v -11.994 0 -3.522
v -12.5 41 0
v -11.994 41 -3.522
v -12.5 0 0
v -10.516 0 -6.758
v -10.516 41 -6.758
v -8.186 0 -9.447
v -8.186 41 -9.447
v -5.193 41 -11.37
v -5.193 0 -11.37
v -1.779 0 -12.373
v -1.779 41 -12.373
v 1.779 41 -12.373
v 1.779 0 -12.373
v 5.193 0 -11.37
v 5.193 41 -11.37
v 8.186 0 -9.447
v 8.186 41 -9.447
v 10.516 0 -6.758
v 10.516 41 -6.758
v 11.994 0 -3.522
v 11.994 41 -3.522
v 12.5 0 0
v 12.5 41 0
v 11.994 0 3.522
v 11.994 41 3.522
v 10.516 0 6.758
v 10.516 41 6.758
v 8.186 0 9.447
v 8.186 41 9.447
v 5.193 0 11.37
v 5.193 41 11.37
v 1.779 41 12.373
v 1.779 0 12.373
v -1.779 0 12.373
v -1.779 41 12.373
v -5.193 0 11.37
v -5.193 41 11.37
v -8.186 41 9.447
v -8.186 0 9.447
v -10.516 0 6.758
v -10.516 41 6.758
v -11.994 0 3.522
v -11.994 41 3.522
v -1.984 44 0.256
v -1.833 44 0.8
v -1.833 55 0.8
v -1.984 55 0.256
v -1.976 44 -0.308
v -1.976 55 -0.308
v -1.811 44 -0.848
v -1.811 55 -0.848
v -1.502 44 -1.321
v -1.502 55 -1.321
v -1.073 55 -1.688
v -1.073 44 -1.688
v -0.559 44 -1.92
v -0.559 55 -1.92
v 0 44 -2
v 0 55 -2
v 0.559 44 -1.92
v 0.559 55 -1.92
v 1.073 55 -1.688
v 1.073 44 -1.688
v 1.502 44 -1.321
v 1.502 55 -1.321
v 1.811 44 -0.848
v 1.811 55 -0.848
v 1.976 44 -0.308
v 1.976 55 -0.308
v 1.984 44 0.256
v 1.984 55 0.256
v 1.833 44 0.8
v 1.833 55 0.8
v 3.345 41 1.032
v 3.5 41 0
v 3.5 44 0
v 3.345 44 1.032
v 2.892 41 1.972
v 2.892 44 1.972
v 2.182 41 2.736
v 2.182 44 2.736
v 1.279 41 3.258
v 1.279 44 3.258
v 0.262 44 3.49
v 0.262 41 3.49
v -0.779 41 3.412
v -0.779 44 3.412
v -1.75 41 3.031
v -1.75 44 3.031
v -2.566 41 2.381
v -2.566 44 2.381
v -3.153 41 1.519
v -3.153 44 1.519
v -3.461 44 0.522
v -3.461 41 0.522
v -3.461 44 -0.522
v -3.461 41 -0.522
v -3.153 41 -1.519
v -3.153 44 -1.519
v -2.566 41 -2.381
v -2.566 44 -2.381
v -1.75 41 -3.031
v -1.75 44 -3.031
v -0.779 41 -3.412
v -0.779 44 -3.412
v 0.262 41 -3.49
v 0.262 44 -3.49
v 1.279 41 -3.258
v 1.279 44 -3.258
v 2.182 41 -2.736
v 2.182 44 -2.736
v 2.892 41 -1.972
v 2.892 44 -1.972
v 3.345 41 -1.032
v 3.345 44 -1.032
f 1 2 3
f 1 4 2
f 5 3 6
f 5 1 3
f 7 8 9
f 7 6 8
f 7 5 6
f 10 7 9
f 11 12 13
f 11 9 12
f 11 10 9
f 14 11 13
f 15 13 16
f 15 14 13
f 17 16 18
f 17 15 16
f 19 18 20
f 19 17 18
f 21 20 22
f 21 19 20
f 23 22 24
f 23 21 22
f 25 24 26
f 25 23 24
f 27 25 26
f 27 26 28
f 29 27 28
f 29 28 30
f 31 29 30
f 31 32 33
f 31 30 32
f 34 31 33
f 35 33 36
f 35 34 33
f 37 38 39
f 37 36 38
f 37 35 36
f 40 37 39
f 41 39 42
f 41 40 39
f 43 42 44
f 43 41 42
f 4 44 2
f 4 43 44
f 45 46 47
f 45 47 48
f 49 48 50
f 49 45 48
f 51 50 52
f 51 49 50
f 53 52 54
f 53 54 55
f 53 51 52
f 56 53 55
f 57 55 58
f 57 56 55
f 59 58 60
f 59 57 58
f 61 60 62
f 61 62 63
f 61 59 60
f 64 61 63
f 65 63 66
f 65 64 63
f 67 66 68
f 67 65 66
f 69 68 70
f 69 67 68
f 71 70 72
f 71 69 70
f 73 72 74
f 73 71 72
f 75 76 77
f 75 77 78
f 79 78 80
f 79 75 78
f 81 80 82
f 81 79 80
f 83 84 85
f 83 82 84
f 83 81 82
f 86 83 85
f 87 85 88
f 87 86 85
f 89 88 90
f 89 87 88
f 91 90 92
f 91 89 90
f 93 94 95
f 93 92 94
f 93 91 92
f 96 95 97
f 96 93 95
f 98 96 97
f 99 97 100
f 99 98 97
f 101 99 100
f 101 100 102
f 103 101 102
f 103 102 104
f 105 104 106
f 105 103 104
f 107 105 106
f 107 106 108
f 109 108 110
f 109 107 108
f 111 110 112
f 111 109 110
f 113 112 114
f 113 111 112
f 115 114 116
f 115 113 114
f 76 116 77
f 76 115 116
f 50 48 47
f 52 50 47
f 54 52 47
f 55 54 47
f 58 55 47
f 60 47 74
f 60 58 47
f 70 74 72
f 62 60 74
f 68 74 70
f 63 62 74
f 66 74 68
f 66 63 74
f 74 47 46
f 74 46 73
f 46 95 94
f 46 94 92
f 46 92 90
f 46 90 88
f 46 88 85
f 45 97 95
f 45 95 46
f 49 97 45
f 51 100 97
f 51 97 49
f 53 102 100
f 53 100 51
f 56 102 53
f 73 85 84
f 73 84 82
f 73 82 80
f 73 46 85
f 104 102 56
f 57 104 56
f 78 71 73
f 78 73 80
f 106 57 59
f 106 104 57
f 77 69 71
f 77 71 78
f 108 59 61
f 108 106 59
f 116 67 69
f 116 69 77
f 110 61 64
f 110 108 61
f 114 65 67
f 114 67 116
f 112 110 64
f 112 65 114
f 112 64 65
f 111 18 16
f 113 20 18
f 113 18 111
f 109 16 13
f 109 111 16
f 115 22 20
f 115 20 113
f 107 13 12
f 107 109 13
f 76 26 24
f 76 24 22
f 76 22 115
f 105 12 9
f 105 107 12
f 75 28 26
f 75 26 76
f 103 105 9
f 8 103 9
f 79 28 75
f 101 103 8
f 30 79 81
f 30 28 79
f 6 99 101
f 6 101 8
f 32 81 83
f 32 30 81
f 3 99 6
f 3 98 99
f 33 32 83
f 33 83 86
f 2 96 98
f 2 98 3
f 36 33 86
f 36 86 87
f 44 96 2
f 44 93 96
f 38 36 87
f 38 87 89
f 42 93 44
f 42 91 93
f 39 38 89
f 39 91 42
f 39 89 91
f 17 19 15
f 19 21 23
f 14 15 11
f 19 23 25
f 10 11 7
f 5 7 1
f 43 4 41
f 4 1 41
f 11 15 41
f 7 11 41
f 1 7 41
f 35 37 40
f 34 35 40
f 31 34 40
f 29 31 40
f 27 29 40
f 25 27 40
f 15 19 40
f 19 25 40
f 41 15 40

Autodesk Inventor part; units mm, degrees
ref_plane "YZ Plane" through (0, 0, 0) normal (1, 0, 0) x (0, 1, 0)
ref_plane "XZ Plane" through (0, 0, 0) normal (0, 1, 0) x (-1, 0, 0)
ref_plane "XY Plane" through (0, 0, 0) normal (0, 0, 1) x (1, 0, 0)
sketch "草图1" plane through (0, 0, 0) normal (0, 1, 0) x (-1, 0, 0)
  circle A0 centre (0, 0) radius 12.5
  dimension "d0" = 25
extrude "拉伸1" add sketch "草图1" along normal blind 41
sketch "草图2" plane through (0, 41, 0) normal (0, 1, 0) x (1, 0, 0)
  circle A0 centre (0, 0) radius 3.5
  dimension "d3" = 7
extrude "拉伸2" add sketch "草图2" along normal blind 3
sketch "草图3" plane through (0, 44, 0) normal (0, 1, 0) x (1, 0, 0)
  circle A0 centre (0, 0) radius 2
  dimension "d6" = 4
extrude "拉伸3" add sketch "草图3" along normal blind 11
sketch "草图4" plane through (0, 55, 0) normal (0, 1, 0) x (1, 0, 0)
  line L0 (-4.637, -0.8) -> (5.5705, -0.8)
  line L1 (-17.5, 0) -> (17.5, 0) projected
  arc A0 (-1.833, -0.8) -> (1.833, -0.8) centre (0, 0) ccw
  dimension "d9" = 0.8
  dimension "d10" = 2
extrude "拉伸4" cut sketch "草图4" against normal blind 11
properties part number "电机" material "金色"
